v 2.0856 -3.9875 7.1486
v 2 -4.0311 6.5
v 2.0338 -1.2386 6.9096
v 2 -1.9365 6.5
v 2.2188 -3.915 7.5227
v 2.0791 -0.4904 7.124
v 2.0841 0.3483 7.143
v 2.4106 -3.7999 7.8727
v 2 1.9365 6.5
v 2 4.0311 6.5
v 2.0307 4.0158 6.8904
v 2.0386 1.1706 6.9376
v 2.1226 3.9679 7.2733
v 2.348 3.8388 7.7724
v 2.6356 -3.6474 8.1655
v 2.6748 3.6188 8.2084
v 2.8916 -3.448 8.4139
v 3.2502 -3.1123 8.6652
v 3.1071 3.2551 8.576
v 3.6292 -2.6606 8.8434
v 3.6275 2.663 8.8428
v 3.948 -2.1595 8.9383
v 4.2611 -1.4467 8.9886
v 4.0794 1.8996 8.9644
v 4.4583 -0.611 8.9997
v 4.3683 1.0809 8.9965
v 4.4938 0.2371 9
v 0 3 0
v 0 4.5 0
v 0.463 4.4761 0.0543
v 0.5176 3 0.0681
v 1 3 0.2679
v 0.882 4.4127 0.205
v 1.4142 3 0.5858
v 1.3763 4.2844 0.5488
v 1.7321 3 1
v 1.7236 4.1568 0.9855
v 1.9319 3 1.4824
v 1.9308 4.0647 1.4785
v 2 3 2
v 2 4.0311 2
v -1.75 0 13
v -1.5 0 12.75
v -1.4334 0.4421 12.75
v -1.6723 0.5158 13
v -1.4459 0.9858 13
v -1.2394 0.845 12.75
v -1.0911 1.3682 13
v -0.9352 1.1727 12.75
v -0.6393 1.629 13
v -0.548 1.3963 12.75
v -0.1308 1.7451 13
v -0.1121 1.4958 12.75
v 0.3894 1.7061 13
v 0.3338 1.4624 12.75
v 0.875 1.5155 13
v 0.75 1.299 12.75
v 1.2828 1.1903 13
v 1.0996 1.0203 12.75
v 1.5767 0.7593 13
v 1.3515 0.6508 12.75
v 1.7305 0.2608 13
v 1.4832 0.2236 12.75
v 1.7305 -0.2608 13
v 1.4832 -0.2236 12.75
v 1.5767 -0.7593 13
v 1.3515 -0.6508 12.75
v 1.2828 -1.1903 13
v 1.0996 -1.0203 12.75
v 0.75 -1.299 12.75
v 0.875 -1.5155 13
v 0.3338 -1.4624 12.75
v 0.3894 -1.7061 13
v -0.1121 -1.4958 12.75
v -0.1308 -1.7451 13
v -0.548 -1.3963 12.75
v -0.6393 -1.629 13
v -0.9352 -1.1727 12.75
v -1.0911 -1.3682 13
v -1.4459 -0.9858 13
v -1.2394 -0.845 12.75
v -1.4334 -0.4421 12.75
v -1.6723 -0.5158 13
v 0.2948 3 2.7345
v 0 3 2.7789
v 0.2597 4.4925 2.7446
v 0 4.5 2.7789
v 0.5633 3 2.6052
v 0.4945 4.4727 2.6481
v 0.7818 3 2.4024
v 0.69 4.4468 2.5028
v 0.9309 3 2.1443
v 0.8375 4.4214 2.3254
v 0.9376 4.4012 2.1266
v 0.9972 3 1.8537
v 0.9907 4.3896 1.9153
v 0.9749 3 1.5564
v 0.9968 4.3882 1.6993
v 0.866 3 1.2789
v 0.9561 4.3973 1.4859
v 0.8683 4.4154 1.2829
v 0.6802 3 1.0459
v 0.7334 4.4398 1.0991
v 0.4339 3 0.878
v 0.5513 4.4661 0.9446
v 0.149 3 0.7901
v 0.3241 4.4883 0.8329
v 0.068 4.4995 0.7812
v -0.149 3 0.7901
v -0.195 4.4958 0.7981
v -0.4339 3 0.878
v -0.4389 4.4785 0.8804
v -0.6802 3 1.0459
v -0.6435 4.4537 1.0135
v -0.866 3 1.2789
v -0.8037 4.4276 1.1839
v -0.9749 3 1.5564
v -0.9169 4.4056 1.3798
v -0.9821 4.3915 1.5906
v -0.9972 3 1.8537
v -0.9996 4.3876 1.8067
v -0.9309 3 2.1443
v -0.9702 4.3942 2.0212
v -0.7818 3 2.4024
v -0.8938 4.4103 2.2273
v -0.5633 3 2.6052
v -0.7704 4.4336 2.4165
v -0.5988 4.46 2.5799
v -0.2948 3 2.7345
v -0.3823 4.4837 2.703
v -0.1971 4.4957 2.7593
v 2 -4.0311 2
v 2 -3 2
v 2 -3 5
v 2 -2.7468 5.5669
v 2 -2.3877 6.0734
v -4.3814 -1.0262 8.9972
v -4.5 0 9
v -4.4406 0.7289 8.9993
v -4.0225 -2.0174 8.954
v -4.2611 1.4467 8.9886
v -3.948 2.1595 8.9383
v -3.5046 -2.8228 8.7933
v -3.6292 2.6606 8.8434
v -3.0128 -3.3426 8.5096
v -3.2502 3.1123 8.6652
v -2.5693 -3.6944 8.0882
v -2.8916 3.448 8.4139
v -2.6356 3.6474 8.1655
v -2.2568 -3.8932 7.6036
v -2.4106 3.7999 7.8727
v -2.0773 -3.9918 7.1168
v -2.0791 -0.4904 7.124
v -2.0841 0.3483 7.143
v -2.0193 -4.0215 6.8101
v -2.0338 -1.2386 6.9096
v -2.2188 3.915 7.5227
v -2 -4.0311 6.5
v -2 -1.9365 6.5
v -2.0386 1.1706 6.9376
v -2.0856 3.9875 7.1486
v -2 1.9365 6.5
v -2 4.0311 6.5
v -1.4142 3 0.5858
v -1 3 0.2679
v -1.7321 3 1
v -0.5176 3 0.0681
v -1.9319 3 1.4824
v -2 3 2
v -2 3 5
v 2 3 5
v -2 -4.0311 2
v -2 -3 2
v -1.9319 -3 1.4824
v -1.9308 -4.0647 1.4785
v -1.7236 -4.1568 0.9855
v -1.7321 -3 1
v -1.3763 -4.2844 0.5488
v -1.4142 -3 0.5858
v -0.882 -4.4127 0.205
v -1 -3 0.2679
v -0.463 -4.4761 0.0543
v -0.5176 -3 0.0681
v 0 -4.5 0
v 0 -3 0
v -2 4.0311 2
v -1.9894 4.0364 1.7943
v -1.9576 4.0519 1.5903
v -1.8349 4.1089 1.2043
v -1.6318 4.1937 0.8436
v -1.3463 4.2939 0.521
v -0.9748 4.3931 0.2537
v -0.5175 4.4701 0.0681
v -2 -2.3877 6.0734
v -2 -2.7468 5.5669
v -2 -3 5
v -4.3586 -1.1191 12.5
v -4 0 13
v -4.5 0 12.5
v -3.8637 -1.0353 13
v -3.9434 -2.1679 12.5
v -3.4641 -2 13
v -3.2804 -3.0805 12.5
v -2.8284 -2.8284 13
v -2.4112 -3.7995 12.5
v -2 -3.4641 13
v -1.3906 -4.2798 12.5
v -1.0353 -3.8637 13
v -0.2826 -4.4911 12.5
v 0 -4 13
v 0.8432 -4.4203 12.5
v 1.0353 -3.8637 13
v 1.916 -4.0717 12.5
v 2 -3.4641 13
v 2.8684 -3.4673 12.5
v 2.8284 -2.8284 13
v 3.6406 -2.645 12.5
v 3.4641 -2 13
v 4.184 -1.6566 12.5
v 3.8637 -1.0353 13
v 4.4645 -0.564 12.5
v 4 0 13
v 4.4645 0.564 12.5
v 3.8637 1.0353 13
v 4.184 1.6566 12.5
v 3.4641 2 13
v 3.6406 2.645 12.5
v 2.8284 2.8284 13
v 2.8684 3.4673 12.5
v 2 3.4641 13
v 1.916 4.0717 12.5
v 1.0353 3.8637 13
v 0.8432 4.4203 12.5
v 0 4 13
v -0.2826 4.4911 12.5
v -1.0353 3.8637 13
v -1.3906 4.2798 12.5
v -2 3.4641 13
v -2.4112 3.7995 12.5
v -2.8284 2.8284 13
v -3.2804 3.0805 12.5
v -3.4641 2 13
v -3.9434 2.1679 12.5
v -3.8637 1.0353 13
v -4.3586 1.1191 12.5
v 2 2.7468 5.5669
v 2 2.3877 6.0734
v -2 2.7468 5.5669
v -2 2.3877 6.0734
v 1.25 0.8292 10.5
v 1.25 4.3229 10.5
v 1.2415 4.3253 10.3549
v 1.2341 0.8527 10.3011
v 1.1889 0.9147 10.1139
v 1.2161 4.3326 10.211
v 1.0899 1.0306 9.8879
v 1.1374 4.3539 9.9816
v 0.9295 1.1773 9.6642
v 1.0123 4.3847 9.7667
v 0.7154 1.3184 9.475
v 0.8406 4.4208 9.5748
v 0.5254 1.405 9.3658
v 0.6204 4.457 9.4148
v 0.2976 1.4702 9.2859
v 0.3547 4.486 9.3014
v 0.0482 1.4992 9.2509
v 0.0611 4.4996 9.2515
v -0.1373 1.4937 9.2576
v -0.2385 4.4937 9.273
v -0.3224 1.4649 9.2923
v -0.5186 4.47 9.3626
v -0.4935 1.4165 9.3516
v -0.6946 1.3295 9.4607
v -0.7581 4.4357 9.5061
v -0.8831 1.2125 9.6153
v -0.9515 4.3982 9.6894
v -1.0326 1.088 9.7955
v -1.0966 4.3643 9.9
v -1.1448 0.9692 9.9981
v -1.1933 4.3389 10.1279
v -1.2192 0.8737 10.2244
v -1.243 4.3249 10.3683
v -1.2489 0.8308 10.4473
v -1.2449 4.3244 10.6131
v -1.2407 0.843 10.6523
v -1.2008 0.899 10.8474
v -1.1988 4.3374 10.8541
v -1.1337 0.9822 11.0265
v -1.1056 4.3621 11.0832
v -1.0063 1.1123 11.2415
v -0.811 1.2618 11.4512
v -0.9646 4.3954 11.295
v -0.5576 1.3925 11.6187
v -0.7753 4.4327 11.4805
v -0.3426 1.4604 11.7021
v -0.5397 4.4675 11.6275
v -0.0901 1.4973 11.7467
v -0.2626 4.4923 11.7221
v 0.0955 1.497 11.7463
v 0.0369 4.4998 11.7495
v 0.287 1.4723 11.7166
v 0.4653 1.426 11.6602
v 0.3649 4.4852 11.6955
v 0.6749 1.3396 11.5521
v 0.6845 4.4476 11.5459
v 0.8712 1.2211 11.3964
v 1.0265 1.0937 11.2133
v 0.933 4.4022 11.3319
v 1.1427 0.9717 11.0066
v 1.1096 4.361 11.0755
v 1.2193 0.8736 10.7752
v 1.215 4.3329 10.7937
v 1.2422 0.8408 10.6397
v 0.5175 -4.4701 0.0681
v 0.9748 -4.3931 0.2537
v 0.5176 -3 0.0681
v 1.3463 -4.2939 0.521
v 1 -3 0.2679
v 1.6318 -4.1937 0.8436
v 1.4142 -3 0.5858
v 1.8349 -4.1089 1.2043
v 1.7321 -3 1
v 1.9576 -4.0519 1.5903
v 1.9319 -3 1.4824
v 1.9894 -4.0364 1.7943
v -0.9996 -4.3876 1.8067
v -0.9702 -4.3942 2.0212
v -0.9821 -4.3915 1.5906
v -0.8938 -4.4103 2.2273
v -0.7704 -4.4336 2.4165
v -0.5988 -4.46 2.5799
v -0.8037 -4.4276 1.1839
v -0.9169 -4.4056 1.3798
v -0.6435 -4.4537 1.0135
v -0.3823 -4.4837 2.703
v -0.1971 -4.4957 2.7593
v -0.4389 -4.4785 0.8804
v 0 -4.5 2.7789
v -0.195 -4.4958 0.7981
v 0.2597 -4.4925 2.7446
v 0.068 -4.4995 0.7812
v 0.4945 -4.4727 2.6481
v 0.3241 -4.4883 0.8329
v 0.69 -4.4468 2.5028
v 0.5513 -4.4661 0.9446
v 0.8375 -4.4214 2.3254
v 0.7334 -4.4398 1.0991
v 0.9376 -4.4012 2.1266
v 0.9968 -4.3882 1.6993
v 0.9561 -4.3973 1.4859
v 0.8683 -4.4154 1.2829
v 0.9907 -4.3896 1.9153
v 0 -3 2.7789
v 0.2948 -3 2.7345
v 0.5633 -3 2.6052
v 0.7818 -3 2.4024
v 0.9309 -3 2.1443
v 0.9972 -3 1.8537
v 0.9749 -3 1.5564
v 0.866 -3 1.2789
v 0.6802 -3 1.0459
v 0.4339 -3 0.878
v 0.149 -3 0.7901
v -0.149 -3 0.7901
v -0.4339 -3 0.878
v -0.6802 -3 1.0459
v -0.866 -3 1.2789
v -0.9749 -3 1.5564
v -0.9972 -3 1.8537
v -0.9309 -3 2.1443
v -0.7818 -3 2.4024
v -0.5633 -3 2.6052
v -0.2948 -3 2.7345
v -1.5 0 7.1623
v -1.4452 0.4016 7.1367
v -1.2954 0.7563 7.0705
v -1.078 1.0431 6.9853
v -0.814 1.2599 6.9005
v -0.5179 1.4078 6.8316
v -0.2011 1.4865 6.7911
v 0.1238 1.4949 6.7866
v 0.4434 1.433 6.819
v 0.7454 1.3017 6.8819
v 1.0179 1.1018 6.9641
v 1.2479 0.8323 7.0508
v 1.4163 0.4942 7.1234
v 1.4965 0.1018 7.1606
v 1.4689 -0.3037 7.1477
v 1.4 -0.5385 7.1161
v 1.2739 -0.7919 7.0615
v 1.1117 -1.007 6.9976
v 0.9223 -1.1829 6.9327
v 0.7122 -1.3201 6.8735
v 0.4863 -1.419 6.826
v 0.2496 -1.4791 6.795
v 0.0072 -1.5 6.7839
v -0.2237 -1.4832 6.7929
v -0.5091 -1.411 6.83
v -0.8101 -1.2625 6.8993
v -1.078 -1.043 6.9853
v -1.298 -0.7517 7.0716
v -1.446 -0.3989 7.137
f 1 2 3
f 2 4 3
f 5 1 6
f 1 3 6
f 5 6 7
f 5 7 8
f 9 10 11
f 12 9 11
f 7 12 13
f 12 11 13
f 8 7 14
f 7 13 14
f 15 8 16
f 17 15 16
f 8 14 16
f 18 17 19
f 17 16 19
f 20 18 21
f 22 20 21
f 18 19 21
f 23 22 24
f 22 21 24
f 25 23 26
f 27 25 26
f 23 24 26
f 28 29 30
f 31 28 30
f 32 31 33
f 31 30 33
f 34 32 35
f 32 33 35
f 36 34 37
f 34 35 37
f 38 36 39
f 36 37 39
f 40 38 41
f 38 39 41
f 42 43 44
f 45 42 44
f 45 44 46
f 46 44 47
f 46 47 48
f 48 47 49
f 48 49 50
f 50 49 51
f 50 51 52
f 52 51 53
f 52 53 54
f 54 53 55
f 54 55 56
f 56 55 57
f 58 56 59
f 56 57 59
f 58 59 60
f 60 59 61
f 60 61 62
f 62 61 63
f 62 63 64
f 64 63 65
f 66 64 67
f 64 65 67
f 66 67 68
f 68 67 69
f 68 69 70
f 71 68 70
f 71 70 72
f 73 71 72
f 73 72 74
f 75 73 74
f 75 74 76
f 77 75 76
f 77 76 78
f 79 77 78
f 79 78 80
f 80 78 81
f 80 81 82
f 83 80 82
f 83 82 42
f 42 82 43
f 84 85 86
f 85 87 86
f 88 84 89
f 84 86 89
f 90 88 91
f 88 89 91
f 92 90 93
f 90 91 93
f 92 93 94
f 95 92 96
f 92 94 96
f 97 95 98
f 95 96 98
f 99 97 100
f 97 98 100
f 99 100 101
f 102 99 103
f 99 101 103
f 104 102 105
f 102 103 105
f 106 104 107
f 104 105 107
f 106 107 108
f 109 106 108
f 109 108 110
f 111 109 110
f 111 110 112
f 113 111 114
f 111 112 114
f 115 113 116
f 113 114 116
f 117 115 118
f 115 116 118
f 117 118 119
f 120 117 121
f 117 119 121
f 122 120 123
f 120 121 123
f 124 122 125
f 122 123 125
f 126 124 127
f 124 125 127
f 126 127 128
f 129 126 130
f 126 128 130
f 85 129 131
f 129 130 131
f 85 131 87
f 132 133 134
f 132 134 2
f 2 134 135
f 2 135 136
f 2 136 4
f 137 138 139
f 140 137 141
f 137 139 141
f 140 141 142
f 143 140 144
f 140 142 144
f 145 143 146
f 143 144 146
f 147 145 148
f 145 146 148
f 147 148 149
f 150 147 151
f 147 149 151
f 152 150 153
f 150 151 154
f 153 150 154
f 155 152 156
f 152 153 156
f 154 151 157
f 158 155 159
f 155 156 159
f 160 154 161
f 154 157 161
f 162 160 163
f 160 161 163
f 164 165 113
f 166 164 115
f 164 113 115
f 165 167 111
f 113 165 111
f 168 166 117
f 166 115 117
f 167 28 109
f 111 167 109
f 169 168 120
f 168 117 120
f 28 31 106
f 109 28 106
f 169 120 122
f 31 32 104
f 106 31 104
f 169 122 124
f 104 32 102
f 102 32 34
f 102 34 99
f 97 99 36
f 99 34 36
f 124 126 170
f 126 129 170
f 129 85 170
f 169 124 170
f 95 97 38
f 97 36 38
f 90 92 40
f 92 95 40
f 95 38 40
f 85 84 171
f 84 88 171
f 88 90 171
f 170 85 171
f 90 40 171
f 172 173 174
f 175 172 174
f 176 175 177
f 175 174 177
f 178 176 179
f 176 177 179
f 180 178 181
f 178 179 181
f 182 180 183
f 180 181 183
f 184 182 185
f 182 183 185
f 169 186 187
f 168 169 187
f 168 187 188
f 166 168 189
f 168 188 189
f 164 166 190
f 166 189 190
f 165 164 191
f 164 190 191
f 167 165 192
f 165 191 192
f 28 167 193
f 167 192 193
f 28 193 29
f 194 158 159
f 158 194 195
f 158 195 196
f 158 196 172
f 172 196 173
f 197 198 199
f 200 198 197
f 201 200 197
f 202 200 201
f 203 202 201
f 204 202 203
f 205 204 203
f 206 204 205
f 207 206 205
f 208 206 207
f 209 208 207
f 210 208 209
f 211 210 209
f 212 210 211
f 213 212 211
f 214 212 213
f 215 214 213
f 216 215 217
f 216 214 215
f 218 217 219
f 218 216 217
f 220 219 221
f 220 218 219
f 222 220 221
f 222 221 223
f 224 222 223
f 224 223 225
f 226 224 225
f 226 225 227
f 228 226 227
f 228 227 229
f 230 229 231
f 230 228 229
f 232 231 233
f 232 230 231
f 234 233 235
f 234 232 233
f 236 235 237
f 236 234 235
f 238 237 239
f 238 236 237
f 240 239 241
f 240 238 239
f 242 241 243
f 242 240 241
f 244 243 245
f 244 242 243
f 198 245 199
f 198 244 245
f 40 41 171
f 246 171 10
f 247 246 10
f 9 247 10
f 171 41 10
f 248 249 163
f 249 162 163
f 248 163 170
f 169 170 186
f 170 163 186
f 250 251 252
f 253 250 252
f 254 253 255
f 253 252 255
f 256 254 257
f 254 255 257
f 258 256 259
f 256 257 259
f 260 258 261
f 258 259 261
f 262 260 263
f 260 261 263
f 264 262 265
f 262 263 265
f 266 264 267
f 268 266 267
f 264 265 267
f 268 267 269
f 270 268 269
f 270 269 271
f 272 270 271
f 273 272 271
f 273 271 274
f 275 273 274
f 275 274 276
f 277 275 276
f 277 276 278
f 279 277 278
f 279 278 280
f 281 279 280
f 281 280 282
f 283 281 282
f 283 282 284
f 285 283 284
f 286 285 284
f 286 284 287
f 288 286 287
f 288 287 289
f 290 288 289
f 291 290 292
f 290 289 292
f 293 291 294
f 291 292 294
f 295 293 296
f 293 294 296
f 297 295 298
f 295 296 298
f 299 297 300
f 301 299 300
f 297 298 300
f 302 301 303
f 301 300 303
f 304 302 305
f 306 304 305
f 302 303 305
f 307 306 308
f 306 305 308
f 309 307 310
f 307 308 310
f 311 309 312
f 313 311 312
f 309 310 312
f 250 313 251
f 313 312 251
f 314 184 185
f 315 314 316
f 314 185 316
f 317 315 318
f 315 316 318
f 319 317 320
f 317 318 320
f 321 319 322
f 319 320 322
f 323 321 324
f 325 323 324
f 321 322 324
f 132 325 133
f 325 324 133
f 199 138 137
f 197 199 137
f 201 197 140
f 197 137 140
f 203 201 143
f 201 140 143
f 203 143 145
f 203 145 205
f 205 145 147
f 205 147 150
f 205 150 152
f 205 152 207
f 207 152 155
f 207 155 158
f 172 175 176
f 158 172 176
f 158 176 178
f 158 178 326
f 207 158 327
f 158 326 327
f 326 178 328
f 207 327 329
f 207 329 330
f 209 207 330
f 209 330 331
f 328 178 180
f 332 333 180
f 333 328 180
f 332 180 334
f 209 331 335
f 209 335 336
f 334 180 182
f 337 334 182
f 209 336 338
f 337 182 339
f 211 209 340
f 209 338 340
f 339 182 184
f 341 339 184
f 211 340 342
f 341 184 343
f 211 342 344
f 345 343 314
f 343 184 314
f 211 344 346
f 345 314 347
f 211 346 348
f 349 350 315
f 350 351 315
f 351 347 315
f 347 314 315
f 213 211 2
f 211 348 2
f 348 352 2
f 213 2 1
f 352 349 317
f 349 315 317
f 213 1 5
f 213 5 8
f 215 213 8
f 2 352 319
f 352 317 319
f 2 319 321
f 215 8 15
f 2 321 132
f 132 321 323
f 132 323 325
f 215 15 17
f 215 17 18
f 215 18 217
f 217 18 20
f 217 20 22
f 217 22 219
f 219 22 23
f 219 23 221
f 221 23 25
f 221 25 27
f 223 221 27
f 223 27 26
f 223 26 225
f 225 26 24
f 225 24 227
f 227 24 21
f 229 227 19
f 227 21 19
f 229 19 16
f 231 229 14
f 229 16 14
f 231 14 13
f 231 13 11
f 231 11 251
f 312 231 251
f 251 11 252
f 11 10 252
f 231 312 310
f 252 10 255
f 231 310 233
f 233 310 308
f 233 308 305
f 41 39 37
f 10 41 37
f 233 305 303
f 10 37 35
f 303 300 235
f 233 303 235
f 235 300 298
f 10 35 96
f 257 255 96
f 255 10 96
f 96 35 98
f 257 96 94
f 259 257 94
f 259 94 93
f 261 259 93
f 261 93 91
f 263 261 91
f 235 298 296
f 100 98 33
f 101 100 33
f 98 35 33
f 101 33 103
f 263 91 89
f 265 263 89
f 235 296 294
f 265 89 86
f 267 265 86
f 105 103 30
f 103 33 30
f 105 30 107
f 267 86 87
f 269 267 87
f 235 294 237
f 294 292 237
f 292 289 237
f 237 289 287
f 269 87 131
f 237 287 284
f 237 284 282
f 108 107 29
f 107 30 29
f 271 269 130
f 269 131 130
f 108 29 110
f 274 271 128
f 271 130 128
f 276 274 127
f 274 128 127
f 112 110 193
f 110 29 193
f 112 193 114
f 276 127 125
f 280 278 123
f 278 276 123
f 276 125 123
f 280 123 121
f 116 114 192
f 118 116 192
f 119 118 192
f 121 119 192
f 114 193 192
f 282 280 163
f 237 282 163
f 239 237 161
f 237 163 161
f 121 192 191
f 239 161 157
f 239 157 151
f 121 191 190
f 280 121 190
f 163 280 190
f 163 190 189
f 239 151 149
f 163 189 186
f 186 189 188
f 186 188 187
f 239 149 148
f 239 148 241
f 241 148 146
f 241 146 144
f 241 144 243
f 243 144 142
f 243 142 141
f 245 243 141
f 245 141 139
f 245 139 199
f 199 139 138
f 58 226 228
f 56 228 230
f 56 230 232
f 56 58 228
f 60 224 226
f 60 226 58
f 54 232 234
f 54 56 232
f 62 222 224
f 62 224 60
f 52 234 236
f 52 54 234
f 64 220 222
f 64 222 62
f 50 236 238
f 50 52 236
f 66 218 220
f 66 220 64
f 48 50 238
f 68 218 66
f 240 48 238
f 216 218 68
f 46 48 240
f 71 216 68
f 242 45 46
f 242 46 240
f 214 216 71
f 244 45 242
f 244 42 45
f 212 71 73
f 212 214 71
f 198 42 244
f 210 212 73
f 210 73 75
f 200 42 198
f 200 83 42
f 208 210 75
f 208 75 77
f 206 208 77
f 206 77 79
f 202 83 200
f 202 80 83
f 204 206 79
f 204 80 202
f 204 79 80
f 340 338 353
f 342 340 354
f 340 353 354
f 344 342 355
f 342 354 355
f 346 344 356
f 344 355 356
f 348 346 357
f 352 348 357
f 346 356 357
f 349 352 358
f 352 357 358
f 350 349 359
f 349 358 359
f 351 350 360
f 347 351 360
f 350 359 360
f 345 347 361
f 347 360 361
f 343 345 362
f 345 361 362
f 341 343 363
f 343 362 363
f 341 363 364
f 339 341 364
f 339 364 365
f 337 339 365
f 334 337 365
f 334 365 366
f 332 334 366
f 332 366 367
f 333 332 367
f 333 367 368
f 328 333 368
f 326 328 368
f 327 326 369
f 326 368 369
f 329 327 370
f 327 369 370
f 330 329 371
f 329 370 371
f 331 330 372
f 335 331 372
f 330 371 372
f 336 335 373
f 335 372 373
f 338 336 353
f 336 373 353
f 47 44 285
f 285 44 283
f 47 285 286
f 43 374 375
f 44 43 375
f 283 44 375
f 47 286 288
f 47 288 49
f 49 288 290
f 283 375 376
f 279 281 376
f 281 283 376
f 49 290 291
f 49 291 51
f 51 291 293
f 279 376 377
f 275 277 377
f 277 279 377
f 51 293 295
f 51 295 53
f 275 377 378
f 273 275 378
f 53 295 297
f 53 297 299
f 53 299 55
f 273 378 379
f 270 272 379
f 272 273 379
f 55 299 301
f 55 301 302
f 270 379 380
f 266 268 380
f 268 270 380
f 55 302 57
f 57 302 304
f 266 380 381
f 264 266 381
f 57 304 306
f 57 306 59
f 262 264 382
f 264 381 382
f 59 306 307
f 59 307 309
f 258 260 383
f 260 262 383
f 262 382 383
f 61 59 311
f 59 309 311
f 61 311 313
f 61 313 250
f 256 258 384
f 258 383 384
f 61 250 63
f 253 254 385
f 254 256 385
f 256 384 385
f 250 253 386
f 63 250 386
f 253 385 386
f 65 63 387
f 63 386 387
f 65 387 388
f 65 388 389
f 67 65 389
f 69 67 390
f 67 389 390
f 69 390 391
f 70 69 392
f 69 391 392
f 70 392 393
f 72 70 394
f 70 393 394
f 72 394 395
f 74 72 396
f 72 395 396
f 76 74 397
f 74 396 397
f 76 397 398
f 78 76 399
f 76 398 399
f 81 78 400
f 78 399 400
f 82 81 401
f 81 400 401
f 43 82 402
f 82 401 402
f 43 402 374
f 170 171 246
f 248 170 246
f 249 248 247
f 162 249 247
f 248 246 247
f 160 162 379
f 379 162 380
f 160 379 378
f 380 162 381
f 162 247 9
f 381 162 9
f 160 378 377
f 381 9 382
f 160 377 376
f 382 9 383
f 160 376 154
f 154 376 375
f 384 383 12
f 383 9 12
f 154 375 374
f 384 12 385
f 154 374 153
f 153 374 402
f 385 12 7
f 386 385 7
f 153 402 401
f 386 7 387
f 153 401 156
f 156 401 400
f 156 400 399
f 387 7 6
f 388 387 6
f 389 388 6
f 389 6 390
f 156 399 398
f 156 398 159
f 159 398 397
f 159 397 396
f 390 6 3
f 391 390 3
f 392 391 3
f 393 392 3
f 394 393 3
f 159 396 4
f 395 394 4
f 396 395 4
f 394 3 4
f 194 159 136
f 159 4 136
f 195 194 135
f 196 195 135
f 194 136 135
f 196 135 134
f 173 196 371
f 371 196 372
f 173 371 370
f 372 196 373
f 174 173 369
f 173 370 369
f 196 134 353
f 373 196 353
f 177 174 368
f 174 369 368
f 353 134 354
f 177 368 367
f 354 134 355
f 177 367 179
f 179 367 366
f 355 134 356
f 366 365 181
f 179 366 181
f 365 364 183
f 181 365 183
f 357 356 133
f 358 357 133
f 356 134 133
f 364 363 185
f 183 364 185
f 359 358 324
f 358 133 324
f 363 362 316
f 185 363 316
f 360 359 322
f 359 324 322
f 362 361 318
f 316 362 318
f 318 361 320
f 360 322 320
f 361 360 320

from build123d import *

# Parameters (mm, degrees)
SKETCH_1_R                = 4.5
EXTRUDE_1_DEPTH           = 13
CUT_EXTRUDE_1_DEPTH       = 6.5
CUT_EXTRUDE_2_DEPTH       = 6.5
SKETCH_4_R                = 1
CUT_EXTRUDE_3_DEPTH       = 6.5
HOLE_WIZARD_1_D           = 3
HOLE_WIZARD_1_CSINK_D     = 3.5
HOLE_WIZARD_1_CSINK_ANGLE = 90
CHAMFER_1_SIZE            = 0.5
HOLE_WIZARD_M3_1_REACH    = 18.439
HOLE_WIZARD_M3_1_BORE_R   = 1.25


with BuildPart() as part:
    # 草图1 → 凸台-拉伸1 (new body)
    with BuildSketch(Plane.XY):
        with Locations(Location((0, 0, 0), (0, 0, 180))):
            Circle(SKETCH_1_R)
    extrude(amount=EXTRUDE_1_DEPTH)

    # 草图2 → 切除-拉伸1 (cut, symmetric)
    with BuildSketch(Plane(origin=(0, 0, 0), x_dir=(1, 0, 0), z_dir=(0, 1, 0))):
        with BuildLine():
            Line((5e-09, 0), (-4.5, 0))
            Line((-4.5, 0), (-4.5, -9))
            ThreePointArc((-4.5, -9), (-2.732233047, -8.267766953), (-2, -6.5))
            Line((-2, -6.5), (-2, -2))
            ThreePointArc((-2, -2), (-1.414213561, -0.585786436), (5e-09, 0))
        make_face()
        with BuildLine():
            Line((4.5, 0), (5e-09, 0))
            ThreePointArc((5e-09, 0), (1.414213564, -0.585786439), (2, -2))
            Line((2, -2), (2, -6.5))
            ThreePointArc((2, -6.5), (2.732233047, -8.267766953), (4.5, -9))
            Line((4.5, -9), (4.5, 0))
        make_face()
    extrude(amount=CUT_EXTRUDE_1_DEPTH, both=True, mode=Mode.SUBTRACT)

    # 草图3 → 切除-拉伸2 (cut, symmetric)
    with BuildSketch(Plane(origin=(0, 0, 0), x_dir=(0, 0, -1), z_dir=(1, 0, 0))):
        with BuildLine():
            Line((0, 3), (-5, 3))
            ThreePointArc((-5, 3), (-7.16227766, 0), (-5, -3))
            Line((-5, -3), (0, -3))
            Line((0, -3), (0, 3))
        make_face()
    extrude(amount=CUT_EXTRUDE_2_DEPTH, both=True, mode=Mode.SUBTRACT)

    # 草图4 → 切除-拉伸3 (cut, symmetric)
    with BuildSketch(Plane(origin=(0, 0, 0), x_dir=(1, 0, 0), z_dir=(0, 1, 0))):
        with Locations(Location((0, -1.778928225, 0), (0, 0, 270))):
            Circle(SKETCH_4_R)
    extrude(amount=CUT_EXTRUDE_3_DEPTH, both=True, mode=Mode.SUBTRACT)

    # 打孔尺寸根据开槽半沉头木螺钉的类型1 (through all)
    with Locations(Plane.XY.offset(13)):
        with Locations((0, 0)):
            CounterSinkHole(HOLE_WIZARD_1_D / 2, HOLE_WIZARD_1_CSINK_D / 2, counter_sink_angle=HOLE_WIZARD_1_CSINK_ANGLE)

    # 倒角1
    chamfer_1_edges = [part.edges().sort_by_distance(p)[0] for p in [
        (4.5, 0, 13),
    ]]
    chamfer(chamfer_1_edges, length=CHAMFER_1_SIZE)

    # M3 螺纹孔1 bore → M3 螺纹孔1 (cut, up to next)
    with BuildSketch(Plane(origin=(0, 4.5, 0), x_dir=(1, 0, 0), z_dir=(0, 1, 0)), mode=Mode.PRIVATE) as hole_wizard_m3_1_sk1:
        with Locations((0, -10.5)):
            Circle(HOLE_WIZARD_M3_1_BORE_R)
    hole_wizard_m3_1_tool1 = extrude(hole_wizard_m3_1_sk1.sketch, amount=-HOLE_WIZARD_M3_1_REACH, mode=Mode.PRIVATE) & part.part
    add(hole_wizard_m3_1_tool1.solids().sort_by_distance((0, 4.5, 10.5))[0], mode=Mode.SUBTRACT)


solid = part.part
